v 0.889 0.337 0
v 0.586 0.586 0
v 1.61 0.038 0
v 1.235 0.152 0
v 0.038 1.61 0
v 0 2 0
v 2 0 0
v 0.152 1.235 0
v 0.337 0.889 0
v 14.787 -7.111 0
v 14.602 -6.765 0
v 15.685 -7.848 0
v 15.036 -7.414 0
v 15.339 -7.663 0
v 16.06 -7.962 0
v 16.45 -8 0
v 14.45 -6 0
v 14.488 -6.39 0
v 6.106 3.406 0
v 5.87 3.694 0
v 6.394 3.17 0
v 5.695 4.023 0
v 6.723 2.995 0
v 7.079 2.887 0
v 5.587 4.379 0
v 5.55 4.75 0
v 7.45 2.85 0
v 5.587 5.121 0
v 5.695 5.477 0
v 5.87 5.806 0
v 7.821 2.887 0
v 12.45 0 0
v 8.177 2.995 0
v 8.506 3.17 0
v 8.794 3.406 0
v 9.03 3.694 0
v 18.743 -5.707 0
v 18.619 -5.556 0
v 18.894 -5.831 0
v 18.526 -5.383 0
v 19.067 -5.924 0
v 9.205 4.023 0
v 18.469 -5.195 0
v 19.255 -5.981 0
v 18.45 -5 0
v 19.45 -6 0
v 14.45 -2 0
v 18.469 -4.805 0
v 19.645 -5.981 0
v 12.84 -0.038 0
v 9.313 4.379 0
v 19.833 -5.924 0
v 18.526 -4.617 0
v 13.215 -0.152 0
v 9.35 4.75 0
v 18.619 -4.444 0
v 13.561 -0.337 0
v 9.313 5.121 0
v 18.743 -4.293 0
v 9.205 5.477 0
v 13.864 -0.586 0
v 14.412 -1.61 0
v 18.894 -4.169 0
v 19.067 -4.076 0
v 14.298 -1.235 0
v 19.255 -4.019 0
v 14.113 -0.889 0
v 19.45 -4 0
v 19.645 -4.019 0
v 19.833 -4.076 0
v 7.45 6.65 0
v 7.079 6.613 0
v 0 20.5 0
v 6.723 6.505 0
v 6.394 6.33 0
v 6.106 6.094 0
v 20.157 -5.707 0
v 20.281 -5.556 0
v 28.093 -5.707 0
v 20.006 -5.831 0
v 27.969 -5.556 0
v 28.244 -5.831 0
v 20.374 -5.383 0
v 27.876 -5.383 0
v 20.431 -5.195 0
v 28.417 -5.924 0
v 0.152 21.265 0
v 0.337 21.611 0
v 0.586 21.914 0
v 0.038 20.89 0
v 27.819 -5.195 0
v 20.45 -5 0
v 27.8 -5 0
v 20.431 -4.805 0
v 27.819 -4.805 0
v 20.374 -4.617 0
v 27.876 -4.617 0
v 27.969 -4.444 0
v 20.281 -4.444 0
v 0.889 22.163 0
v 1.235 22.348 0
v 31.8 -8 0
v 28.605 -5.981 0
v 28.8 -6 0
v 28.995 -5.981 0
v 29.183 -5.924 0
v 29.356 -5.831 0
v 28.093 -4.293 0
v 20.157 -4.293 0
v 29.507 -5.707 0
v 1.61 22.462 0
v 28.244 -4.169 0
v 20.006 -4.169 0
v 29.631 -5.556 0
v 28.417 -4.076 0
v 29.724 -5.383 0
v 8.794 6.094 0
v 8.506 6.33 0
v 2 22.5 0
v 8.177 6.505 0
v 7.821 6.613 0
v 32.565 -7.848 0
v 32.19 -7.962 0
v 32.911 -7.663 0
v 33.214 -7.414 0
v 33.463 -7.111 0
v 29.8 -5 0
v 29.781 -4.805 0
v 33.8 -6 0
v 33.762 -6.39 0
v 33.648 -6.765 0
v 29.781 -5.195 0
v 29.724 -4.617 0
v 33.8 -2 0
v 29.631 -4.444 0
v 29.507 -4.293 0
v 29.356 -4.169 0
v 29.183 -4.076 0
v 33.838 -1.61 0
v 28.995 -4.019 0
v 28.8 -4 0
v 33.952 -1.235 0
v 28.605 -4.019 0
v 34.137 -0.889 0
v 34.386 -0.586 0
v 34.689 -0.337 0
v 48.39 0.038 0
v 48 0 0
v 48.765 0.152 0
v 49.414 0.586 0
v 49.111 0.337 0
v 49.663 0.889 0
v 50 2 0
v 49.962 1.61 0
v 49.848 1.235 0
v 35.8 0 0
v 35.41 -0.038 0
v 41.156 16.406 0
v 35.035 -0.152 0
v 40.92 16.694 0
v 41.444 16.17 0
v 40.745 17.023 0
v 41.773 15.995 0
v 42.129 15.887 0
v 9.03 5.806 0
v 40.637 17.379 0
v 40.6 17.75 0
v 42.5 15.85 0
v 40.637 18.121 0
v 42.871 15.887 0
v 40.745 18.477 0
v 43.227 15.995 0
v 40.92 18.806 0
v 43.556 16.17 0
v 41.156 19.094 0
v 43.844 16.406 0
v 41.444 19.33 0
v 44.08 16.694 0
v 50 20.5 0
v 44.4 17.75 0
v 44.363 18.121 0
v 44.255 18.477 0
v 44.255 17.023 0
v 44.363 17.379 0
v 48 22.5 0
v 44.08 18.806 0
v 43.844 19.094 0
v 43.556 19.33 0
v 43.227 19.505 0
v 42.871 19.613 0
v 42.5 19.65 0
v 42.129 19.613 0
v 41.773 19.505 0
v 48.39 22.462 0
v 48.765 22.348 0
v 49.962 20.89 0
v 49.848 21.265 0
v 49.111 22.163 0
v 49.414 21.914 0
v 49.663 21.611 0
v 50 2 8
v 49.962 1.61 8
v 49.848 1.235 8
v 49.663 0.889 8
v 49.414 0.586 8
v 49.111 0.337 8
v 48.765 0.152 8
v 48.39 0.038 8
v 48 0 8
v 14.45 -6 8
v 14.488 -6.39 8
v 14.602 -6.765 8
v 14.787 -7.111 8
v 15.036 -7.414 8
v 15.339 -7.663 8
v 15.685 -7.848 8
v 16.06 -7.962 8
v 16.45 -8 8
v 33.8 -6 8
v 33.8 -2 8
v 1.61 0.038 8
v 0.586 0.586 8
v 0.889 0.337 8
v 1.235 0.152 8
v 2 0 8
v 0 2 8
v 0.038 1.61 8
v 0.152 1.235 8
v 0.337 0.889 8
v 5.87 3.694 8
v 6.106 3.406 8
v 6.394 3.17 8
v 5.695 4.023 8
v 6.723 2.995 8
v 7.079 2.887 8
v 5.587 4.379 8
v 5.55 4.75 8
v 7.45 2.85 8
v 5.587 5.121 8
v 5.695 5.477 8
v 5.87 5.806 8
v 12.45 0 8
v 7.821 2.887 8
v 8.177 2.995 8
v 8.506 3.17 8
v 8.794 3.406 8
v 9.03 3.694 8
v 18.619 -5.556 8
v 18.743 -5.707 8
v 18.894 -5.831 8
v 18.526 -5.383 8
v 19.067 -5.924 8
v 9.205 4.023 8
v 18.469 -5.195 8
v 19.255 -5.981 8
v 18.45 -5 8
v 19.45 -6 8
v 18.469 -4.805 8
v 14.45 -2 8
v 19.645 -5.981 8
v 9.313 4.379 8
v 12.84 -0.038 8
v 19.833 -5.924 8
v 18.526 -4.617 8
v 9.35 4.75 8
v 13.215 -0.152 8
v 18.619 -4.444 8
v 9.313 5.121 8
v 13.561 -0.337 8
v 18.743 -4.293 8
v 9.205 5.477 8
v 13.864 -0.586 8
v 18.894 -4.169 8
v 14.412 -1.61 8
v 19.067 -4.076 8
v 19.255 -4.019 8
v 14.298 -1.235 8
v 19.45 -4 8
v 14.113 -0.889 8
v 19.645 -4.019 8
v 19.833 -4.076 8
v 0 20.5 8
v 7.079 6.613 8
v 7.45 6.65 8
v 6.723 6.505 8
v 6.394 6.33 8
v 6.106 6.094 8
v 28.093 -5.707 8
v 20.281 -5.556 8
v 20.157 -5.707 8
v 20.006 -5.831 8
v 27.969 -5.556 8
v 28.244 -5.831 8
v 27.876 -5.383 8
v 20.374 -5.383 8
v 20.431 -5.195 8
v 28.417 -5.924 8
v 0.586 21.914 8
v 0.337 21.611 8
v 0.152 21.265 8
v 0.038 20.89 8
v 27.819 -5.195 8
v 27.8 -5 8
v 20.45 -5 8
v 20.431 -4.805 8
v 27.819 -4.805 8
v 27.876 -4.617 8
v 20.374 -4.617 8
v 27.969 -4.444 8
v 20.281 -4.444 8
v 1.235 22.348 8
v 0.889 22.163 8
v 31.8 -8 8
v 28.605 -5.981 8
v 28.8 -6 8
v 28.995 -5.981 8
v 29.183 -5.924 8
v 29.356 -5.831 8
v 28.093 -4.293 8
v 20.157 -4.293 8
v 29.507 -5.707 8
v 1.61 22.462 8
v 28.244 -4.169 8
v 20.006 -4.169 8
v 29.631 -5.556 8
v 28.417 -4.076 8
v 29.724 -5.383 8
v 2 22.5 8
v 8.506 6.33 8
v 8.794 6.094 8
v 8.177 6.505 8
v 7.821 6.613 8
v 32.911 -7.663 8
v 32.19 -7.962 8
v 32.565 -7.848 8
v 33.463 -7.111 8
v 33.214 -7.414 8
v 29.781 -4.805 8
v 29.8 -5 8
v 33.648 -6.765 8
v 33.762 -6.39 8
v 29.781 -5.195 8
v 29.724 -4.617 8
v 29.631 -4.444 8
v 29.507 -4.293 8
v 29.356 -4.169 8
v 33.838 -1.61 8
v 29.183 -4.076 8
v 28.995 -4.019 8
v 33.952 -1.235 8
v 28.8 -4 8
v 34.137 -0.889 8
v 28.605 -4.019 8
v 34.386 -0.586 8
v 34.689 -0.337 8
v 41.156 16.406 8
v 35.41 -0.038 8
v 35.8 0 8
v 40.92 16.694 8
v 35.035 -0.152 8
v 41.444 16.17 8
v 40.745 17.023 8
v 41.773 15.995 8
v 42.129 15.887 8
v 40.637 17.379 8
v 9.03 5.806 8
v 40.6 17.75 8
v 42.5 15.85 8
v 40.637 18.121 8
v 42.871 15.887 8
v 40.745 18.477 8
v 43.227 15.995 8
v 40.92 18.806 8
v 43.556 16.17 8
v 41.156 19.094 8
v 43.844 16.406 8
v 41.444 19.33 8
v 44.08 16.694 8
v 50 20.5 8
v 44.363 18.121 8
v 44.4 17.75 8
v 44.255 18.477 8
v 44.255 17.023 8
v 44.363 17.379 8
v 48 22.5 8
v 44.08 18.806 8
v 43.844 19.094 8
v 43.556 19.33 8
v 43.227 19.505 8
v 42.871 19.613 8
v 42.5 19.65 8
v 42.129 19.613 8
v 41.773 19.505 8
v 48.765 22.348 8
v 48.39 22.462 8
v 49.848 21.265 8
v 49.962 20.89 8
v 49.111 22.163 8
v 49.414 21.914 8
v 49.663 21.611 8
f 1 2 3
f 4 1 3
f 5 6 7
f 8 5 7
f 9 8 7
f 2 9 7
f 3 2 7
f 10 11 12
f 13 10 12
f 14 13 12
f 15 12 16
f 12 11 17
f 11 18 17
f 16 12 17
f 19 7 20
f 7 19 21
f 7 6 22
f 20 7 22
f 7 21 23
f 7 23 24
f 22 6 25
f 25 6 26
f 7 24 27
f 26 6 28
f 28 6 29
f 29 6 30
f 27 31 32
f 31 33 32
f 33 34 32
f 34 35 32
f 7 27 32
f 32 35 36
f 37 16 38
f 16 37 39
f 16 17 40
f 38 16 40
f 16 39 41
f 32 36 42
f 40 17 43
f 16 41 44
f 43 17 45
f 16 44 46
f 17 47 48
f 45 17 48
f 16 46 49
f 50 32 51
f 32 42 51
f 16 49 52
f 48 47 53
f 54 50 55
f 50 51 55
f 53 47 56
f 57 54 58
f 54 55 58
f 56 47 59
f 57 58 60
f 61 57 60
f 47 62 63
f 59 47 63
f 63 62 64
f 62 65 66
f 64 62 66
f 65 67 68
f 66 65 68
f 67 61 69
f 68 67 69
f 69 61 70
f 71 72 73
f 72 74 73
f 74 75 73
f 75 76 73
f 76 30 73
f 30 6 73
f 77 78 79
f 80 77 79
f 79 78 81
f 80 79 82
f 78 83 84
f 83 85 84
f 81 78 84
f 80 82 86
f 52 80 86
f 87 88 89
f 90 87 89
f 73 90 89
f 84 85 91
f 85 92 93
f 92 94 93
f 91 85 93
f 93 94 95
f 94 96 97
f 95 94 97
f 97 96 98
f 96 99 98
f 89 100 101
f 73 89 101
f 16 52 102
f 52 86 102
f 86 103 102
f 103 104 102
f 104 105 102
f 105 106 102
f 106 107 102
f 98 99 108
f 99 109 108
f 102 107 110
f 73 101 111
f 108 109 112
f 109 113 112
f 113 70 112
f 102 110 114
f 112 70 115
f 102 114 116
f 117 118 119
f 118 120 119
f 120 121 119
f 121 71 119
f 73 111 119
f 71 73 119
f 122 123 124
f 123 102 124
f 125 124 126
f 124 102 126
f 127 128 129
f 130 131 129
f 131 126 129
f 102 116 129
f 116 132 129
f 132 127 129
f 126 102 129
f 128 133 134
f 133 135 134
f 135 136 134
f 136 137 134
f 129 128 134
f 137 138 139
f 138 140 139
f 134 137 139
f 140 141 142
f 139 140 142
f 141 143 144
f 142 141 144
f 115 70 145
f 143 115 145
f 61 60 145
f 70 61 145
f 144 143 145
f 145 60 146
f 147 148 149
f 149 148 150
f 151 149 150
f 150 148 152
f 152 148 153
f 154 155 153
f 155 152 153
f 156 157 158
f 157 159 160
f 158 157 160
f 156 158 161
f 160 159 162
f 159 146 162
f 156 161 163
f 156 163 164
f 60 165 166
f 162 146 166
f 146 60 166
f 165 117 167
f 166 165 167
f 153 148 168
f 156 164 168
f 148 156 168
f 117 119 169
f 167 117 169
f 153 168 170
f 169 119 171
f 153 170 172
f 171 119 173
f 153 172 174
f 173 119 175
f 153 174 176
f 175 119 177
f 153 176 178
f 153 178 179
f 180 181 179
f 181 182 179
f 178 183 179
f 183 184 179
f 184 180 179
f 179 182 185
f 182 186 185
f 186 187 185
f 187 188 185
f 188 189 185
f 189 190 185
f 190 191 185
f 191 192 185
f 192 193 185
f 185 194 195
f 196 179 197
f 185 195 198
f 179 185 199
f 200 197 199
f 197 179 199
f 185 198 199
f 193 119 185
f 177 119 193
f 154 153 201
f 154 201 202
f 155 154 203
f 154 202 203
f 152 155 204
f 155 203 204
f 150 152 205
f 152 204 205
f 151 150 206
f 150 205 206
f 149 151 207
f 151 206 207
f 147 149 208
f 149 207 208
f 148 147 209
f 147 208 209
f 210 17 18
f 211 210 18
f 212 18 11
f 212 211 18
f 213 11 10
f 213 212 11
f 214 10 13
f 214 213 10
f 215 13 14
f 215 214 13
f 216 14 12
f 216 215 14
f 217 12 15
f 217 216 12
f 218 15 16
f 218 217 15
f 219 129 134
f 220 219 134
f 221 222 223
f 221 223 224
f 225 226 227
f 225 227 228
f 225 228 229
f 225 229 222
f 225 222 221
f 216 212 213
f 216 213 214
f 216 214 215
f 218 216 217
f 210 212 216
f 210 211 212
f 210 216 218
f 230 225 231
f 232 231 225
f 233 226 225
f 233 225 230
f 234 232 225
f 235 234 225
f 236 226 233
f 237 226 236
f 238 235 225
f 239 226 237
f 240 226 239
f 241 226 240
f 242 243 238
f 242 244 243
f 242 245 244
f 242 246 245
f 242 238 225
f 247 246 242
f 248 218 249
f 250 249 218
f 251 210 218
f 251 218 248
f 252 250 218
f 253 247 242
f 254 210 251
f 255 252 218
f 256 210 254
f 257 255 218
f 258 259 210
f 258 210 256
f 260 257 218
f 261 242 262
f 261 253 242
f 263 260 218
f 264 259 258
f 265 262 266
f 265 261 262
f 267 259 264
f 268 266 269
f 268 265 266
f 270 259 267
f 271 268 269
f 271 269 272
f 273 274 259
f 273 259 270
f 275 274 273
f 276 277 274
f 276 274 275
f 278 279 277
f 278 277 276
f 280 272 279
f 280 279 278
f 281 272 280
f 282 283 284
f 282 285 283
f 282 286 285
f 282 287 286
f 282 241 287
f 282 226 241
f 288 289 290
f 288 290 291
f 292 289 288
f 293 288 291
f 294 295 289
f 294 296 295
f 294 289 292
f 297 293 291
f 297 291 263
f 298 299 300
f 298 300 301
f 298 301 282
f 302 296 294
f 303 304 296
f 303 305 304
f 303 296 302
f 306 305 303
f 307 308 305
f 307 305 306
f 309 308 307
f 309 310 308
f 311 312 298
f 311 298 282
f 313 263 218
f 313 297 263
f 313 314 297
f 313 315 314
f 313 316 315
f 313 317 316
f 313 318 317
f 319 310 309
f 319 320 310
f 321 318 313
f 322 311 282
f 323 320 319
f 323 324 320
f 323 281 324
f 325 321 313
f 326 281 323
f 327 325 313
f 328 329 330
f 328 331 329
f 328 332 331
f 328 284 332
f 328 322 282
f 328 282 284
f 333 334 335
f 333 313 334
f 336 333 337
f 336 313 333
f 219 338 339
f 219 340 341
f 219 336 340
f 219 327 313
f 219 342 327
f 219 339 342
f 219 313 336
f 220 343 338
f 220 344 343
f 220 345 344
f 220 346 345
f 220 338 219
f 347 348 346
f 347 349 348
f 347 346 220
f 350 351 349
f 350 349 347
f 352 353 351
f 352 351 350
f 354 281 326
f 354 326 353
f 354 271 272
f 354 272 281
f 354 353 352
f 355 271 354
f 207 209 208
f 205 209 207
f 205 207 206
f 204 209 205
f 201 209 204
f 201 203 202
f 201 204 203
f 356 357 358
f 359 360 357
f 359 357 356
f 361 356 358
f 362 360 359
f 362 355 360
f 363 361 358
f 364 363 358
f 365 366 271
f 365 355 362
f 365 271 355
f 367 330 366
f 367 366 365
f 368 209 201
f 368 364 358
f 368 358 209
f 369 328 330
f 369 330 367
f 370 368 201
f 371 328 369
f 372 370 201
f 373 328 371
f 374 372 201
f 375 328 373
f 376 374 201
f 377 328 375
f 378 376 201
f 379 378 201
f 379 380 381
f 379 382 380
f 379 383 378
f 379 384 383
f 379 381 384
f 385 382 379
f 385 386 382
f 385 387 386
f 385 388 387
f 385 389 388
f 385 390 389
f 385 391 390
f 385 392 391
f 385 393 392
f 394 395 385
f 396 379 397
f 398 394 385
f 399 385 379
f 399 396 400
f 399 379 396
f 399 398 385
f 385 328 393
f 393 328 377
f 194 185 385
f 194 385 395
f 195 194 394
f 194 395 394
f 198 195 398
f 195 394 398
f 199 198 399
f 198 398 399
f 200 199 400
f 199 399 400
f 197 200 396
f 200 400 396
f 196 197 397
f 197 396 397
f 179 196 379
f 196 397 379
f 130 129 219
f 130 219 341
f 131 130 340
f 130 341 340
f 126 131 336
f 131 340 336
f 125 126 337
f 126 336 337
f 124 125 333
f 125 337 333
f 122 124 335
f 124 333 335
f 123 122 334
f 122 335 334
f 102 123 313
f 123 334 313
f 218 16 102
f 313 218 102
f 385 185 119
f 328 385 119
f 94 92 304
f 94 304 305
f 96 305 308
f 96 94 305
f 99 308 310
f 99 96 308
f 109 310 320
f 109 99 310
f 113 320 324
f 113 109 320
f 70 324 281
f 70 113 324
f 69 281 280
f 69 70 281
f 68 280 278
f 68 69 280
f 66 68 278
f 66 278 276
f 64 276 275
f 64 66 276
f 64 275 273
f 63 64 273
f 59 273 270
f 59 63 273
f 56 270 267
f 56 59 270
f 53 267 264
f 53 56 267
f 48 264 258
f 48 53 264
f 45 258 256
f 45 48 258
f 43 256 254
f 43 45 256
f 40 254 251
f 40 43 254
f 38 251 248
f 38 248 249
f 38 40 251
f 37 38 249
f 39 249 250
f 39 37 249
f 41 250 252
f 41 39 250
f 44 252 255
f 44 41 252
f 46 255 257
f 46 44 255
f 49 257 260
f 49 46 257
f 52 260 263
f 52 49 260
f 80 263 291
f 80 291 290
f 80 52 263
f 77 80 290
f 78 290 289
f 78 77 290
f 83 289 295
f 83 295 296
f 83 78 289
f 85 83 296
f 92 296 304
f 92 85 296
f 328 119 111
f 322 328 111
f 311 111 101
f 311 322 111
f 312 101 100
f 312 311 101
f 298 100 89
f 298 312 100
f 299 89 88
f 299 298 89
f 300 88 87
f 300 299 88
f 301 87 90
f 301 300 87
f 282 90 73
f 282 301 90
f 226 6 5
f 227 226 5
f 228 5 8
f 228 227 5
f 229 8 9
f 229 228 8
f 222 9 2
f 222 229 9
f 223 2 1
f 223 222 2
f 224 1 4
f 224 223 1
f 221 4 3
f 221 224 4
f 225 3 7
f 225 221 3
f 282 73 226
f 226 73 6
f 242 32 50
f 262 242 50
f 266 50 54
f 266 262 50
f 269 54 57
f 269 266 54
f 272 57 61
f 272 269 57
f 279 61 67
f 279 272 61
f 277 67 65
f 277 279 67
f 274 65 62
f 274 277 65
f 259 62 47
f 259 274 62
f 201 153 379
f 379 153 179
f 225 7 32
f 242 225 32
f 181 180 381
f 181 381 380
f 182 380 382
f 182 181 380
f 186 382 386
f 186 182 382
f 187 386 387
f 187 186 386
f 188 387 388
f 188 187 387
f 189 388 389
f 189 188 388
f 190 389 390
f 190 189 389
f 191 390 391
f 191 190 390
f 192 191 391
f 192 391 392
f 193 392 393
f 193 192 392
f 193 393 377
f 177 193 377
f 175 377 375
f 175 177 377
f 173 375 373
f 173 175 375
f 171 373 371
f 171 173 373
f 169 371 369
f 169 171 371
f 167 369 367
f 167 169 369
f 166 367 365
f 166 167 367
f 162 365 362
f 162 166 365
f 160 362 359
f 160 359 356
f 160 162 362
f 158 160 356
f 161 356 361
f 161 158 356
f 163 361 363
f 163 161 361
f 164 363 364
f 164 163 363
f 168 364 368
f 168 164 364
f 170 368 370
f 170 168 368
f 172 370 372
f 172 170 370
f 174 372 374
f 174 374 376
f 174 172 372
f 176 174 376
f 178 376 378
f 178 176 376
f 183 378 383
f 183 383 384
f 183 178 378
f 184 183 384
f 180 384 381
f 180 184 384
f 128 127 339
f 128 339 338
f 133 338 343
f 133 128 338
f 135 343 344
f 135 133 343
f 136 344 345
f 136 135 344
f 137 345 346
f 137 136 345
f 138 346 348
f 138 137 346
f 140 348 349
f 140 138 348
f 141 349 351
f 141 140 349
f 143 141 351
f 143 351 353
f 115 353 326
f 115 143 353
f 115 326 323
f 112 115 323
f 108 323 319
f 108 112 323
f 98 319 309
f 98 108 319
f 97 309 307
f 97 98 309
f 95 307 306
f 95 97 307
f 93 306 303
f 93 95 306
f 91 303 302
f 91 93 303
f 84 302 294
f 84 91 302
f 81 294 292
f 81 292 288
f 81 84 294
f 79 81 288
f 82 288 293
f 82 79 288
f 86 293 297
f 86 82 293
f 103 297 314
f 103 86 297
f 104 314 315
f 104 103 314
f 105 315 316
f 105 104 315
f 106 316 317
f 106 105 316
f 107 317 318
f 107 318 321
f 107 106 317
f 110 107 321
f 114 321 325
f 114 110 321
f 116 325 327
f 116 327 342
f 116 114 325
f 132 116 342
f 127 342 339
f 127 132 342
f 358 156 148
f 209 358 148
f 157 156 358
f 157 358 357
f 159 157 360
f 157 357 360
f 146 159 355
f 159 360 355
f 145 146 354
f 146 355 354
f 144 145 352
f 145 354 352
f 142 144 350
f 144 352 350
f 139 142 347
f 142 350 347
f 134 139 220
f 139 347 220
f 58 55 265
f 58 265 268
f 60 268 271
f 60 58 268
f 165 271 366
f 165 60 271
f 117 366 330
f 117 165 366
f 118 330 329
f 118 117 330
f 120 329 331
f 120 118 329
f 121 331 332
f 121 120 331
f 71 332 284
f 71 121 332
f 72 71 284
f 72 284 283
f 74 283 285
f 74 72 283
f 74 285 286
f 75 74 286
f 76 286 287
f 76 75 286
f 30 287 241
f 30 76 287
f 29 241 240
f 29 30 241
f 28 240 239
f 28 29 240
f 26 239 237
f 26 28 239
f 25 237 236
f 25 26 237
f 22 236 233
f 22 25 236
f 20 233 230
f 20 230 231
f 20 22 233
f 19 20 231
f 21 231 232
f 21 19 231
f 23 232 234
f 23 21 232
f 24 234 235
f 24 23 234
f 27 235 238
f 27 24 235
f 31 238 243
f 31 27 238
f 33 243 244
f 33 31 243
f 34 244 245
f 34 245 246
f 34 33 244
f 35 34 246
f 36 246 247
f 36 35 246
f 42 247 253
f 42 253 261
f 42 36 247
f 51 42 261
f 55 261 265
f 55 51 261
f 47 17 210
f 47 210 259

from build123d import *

# Parameters (mm, degrees)
F0_R     = 1.9
F0_W     = 19.35
F0_H     = 8
F0_R_2   = 1
F1_DEPTH = 8
F2_R     = 2


with BuildPart() as f1:
    # F0 (on Top) → F1 (new body)
    with BuildSketch(Plane.XY):
        Polygon((50, 22.5), (0, 22.5), (0, 0), (14.45, 0), (33.8, 0), (50, 0), align=None)
        with Locations((7.45, 4.75)):
            Circle(F0_R, mode=Mode.SUBTRACT)
        with Locations((42.5, 17.75)):
            Circle(F0_R, mode=Mode.SUBTRACT)
        with Locations((24.125, -4)):
            Rectangle(F0_W, F0_H)
        with Locations((19.45, -5)):
            Circle(F0_R_2, mode=Mode.SUBTRACT)
        with Locations((28.8, -5)):
            Circle(F0_R_2, mode=Mode.SUBTRACT)
    extrude(amount=F1_DEPTH)

    # F2
    f2_edges = [f1.edges().sort_by_distance(p)[0] for p in [
        (14.45, 0, 4),
        (14.45, -8, 4),
        (33.8, -8, 4),
        (33.8, 0, 4),
        (50, 0, 4),
        (50, 22.5, 4),
        (0, 0, 4),
        (0, 22.5, 4),
    ]]
    fillet(f2_edges, radius=F2_R)


solid = f1.part
